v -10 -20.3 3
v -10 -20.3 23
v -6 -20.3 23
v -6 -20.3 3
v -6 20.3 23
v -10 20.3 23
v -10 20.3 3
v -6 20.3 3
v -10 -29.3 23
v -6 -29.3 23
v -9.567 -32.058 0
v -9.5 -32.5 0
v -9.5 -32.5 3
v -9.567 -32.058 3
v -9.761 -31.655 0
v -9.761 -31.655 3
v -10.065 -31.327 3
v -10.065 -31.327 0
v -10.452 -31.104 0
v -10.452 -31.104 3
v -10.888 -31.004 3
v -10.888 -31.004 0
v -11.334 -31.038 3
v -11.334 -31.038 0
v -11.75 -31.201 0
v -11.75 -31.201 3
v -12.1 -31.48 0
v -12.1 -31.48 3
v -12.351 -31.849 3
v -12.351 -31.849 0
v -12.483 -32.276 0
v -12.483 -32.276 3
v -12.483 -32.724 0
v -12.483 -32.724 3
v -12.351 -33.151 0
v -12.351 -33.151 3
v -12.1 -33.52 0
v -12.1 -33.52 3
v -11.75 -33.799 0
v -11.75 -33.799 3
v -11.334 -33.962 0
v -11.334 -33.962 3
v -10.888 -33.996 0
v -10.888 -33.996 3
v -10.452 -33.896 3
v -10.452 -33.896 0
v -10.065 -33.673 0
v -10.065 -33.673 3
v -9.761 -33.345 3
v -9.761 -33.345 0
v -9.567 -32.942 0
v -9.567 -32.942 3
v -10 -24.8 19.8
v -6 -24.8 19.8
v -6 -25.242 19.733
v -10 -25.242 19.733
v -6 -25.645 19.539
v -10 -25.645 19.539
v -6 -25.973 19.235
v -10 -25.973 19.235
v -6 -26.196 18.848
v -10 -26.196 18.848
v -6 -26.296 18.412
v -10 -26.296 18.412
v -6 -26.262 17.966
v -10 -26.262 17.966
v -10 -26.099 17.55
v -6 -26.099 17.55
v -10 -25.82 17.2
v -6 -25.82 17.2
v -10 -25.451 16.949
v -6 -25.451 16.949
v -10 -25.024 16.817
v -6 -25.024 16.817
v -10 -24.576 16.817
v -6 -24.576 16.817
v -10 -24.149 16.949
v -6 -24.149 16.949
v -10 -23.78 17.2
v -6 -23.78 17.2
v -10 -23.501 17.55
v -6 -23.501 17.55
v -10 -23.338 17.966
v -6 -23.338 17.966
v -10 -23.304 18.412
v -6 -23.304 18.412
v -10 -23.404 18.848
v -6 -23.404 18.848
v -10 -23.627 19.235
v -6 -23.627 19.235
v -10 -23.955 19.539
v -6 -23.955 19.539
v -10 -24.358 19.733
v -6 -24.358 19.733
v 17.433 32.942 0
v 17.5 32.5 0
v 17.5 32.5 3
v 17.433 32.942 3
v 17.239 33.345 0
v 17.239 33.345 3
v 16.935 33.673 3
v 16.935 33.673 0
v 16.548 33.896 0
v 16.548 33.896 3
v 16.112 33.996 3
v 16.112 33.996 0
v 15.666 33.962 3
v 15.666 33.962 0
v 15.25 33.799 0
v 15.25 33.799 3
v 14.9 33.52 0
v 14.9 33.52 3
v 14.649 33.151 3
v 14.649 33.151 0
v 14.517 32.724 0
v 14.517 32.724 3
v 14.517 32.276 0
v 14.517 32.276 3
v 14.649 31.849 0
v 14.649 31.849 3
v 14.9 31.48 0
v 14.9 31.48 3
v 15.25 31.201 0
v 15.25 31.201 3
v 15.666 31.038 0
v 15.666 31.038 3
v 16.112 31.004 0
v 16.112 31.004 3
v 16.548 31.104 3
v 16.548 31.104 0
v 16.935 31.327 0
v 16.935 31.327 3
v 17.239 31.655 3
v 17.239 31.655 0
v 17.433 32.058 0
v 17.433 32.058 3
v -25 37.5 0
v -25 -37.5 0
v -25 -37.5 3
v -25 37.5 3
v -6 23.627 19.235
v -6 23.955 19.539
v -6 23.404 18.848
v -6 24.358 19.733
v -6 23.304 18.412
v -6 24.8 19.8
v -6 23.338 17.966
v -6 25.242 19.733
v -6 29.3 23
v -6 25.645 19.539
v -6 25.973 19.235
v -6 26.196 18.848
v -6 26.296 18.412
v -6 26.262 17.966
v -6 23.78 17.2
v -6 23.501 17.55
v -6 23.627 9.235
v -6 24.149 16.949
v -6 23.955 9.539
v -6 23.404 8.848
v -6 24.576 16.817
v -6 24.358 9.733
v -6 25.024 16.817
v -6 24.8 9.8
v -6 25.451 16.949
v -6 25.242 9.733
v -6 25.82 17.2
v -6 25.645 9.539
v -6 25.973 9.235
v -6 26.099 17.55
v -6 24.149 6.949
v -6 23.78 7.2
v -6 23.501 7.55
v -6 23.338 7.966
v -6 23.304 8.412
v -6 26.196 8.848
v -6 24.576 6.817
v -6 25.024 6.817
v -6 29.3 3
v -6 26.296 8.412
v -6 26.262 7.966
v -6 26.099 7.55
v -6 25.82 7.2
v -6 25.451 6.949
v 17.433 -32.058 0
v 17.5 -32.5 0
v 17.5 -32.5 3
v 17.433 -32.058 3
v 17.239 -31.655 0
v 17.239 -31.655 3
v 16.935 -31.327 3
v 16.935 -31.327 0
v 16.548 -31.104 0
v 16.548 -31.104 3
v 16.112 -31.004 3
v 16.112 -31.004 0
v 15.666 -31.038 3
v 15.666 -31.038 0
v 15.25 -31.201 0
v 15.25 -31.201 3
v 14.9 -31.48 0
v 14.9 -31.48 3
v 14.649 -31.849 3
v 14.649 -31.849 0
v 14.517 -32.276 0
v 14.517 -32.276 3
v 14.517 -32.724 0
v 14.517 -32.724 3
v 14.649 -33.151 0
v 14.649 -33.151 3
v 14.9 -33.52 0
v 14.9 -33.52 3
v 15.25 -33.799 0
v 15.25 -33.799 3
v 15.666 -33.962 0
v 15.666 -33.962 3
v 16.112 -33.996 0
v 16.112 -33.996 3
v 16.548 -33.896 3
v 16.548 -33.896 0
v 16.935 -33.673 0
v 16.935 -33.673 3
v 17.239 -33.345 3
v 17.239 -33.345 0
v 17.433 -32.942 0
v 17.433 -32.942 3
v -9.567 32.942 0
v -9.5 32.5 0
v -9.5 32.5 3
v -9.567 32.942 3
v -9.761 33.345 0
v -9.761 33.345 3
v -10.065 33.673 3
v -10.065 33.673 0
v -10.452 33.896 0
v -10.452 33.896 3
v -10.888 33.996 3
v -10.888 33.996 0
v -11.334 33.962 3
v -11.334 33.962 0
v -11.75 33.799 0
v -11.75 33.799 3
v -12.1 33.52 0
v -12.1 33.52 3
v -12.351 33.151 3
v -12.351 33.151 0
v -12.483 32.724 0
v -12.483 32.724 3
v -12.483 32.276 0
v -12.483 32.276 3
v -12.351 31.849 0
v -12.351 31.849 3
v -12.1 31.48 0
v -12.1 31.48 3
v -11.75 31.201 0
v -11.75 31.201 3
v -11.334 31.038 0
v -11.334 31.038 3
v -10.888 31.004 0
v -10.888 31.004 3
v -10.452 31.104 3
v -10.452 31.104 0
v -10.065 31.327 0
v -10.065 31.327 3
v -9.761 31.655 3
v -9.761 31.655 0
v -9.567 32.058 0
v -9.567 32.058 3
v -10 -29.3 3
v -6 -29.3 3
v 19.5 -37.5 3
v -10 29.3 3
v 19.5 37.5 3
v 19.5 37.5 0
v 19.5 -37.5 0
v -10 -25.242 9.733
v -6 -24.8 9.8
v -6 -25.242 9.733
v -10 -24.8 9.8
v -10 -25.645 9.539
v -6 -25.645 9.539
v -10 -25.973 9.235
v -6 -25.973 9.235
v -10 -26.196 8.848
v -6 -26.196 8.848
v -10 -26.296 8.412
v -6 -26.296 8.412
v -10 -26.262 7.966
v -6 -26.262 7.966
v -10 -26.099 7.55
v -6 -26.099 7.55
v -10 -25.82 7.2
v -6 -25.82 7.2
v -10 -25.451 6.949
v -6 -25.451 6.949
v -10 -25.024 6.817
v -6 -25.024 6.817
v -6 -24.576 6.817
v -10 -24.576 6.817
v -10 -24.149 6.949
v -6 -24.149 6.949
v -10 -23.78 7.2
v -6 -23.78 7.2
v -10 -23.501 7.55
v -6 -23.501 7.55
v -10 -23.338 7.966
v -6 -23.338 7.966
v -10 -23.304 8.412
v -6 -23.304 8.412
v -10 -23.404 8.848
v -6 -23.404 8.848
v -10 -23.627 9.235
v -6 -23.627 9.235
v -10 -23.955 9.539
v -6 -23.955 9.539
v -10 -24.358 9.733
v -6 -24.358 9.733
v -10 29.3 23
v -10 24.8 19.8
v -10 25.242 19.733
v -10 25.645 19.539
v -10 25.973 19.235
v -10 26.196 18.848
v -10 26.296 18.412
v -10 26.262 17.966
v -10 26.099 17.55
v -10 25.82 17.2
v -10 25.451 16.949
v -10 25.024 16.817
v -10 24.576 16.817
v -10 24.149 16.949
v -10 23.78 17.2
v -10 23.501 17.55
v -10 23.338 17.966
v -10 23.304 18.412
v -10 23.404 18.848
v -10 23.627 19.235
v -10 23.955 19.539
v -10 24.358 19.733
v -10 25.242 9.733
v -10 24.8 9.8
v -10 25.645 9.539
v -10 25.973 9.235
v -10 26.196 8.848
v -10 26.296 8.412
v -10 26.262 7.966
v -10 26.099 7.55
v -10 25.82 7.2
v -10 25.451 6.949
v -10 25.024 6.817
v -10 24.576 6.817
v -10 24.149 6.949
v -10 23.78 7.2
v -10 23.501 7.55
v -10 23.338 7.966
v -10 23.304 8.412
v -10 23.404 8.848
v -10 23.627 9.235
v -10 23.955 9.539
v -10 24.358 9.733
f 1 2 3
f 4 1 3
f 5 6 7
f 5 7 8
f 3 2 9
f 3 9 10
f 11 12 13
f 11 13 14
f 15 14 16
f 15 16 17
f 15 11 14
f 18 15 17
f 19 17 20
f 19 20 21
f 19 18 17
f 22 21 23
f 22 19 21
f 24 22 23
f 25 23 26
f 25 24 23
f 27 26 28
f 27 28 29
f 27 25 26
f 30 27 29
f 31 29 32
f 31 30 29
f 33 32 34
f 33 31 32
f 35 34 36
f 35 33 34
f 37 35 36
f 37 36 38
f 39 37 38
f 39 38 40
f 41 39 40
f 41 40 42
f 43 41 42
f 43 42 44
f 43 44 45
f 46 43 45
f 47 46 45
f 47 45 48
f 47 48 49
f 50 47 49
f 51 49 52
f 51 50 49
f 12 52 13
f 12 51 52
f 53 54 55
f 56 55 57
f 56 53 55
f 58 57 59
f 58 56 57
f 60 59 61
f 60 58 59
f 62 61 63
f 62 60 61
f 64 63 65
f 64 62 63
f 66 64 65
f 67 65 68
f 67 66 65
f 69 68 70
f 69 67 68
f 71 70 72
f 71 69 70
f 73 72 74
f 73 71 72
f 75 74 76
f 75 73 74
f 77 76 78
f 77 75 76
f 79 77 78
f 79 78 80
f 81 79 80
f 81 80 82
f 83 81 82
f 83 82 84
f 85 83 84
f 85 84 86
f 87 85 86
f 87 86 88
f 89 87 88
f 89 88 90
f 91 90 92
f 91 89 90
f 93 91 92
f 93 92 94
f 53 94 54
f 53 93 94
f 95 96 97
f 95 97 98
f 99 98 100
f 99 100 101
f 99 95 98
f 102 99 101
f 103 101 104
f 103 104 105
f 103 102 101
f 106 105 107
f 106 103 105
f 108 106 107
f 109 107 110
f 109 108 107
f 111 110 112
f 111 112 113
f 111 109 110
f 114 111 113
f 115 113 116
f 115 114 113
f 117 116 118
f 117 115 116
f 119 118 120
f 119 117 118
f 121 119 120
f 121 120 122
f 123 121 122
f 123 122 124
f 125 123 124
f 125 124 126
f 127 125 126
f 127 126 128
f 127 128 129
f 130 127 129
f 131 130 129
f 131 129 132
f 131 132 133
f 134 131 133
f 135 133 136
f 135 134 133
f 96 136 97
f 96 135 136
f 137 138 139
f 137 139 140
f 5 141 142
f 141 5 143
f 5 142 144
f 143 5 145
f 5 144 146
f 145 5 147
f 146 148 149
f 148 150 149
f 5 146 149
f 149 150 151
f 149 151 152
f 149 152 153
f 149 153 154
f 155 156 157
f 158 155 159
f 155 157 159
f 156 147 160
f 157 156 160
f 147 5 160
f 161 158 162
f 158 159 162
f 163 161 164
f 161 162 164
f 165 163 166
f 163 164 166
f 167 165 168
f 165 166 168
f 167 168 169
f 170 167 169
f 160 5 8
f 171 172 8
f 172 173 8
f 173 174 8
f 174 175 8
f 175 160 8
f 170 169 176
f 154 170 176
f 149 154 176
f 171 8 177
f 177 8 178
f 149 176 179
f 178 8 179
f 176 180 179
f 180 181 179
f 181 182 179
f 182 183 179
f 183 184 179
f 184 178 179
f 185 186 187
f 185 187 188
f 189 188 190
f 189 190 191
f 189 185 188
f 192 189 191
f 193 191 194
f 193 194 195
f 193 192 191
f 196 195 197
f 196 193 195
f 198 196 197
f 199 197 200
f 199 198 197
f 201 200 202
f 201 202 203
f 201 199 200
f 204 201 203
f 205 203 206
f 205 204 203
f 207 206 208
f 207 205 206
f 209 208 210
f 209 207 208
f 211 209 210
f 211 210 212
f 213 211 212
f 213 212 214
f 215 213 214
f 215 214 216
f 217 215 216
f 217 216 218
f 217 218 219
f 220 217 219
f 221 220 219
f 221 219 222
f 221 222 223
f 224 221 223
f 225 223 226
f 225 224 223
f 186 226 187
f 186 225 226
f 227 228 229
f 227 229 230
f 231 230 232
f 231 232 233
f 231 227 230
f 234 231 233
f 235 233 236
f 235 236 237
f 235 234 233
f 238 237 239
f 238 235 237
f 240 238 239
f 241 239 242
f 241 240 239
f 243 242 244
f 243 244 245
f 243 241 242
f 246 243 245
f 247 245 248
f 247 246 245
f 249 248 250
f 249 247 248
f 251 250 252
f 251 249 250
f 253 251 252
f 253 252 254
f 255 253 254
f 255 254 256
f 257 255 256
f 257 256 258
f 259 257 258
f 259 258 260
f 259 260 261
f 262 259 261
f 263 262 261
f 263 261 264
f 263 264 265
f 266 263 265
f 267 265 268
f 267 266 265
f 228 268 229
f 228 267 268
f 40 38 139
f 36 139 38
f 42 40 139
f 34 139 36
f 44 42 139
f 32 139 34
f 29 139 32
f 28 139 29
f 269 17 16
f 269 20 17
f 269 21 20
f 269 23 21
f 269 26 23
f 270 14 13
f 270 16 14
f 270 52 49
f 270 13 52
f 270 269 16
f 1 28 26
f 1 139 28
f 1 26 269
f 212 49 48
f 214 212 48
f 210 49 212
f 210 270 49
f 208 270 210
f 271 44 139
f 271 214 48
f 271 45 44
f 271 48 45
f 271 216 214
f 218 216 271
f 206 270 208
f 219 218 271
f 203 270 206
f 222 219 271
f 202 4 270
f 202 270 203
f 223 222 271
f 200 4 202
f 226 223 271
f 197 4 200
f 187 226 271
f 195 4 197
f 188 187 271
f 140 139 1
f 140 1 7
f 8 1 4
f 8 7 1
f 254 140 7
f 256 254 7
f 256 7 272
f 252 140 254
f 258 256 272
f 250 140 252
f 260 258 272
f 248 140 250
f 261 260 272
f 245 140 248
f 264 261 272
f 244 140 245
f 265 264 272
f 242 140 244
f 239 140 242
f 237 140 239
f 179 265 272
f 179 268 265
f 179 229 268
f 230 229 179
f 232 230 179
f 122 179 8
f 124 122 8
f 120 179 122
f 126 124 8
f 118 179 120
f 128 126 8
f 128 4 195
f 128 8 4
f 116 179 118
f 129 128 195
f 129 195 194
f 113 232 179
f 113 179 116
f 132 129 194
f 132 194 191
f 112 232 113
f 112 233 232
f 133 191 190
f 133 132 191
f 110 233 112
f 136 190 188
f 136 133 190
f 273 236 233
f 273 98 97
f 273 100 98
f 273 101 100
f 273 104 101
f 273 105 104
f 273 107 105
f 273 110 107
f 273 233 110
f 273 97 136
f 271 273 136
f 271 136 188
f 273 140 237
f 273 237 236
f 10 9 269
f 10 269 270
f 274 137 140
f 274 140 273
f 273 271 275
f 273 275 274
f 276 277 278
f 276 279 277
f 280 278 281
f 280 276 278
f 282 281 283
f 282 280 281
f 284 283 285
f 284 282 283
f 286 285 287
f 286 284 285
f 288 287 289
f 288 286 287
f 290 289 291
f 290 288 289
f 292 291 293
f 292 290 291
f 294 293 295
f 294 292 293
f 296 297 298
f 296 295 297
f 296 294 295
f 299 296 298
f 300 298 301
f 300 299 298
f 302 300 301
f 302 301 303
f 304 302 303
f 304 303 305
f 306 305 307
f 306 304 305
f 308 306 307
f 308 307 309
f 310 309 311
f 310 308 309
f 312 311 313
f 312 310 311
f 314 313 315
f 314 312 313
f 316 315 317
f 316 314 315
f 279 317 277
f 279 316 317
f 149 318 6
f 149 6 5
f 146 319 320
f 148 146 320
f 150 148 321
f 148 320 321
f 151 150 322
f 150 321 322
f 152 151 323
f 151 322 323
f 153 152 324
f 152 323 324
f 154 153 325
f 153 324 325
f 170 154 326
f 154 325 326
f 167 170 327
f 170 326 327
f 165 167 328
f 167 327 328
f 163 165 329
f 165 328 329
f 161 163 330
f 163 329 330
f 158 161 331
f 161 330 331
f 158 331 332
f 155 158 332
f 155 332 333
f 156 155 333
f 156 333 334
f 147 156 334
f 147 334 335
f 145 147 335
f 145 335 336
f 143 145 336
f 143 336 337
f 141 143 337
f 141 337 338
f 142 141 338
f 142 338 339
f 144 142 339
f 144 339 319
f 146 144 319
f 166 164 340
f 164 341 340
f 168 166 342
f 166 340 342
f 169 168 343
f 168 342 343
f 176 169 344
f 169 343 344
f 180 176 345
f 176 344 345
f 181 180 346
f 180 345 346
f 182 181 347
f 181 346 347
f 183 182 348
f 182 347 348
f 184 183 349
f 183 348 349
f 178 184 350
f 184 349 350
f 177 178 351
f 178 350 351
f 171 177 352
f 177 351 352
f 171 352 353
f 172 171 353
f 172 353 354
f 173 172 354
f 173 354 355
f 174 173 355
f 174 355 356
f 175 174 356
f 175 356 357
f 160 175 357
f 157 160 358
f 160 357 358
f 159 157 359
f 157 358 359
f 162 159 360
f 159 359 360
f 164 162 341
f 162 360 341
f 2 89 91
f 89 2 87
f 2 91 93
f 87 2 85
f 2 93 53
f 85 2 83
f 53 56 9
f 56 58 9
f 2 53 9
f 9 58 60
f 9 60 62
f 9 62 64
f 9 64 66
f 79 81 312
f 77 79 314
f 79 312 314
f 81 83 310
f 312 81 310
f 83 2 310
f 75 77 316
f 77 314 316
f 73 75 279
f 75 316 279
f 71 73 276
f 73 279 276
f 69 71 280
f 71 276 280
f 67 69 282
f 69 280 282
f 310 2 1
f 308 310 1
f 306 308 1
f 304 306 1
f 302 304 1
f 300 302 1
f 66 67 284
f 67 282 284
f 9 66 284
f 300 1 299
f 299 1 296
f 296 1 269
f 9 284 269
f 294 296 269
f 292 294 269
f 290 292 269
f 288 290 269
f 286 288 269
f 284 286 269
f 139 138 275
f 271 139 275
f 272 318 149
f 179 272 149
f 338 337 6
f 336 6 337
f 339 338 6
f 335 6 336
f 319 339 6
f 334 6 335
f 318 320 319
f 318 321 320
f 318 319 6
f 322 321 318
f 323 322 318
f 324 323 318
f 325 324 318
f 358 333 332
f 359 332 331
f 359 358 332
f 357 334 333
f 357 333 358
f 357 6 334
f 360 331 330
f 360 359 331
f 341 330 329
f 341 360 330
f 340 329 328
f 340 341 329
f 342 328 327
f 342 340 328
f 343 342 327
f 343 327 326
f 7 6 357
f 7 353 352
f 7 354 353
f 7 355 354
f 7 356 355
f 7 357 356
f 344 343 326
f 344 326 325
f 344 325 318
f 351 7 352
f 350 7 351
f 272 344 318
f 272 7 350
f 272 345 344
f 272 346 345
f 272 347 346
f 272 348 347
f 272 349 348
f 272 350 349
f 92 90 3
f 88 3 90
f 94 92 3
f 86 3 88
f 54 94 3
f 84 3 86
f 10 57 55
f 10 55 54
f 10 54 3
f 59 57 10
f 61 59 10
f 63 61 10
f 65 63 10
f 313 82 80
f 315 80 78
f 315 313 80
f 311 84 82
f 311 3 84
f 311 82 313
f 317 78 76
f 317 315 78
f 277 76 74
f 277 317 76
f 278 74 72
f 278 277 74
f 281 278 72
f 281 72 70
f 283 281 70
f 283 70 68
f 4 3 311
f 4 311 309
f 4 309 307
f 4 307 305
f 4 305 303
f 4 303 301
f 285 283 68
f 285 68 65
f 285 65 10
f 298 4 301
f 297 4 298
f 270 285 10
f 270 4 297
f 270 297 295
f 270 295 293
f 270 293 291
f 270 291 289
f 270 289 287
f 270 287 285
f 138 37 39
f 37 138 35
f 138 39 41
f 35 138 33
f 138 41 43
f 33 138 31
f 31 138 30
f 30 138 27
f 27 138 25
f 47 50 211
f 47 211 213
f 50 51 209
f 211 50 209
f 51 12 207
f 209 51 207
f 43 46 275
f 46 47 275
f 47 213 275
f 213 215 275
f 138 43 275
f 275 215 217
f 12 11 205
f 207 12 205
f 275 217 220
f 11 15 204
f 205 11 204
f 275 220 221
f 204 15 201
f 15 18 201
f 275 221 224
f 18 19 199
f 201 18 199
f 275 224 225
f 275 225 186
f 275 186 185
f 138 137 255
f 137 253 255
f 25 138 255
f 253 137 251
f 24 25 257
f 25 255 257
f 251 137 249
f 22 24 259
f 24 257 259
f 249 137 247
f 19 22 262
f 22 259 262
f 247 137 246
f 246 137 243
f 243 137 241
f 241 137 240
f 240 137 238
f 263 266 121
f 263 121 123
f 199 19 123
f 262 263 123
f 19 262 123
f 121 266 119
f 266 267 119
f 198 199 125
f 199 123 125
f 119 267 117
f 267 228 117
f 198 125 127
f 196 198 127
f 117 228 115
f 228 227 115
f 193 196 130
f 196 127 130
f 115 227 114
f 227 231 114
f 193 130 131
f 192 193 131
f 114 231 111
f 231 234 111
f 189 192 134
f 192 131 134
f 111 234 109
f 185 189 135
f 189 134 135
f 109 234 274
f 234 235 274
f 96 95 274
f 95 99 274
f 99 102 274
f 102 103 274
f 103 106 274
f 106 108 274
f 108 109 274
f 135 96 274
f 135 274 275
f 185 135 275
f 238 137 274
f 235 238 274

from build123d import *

# Parameters (mm, degrees)
SKETCH1_W           = 50
SKETCH1_H           = 75
SKETCH1_R           = 1.5
BOSS_EXTRUDE1_DEPTH = 3
SKETCH2_W           = 4
SKETCH2_H           = 9
BOSS_EXTRUDE2_DEPTH = 20
SKETCH3_R           = 1.5
CUT_EXTRUDE2_DEPTH  = 57.216100896
SKETCH4_W           = 5.5
SKETCH4_H           = 75
CUT_EXTRUDE3_DEPTH  = 10


with BuildPart() as part:
    # Sketch1 → Boss-Extrude1 (new body)
    with BuildSketch(Plane.XY):
        Rectangle(SKETCH1_W, SKETCH1_H)
        with Locations((-11, 32.5)):
            Circle(SKETCH1_R, mode=Mode.SUBTRACT)
        with Locations((16, 32.5)):
            Circle(SKETCH1_R, mode=Mode.SUBTRACT)
        with Locations((16, -32.5)):
            Circle(SKETCH1_R, mode=Mode.SUBTRACT)
        with Locations((-11, -32.5)):
            Circle(SKETCH1_R, mode=Mode.SUBTRACT)
    extrude(amount=BOSS_EXTRUDE1_DEPTH)

    # Sketch2 → Boss-Extrude2 (add)
    with BuildSketch(Plane.XY.offset(3)):
        with Locations((-8, 24.8)):
            Rectangle(SKETCH2_W, SKETCH2_H)
    boss_extrude2 = extrude(amount=BOSS_EXTRUDE2_DEPTH)

    # Sketch3 → Cut-Extrude2 (cut, symmetric)
    with BuildSketch(Plane.ZY.offset(10)):
        with Locations((18.3, 24.8)):
            Circle(SKETCH3_R)
        with Locations((8.3, 24.8)):
            Circle(SKETCH3_R)
    cut_extrude2 = extrude(amount=CUT_EXTRUDE2_DEPTH, both=True, mode=Mode.SUBTRACT)

    # Mirror3: Boss-Extrude2, Cut-Extrude2 across plane
    add(boss_extrude2.mirror(Plane.ZX))
    add(cut_extrude2.mirror(Plane.ZX), mode=Mode.SUBTRACT)

    # Sketch4 → Cut-Extrude3 (cut)
    with BuildSketch(Plane.XY.offset(3)):
        with Locations((22.25, 0)):
            Rectangle(SKETCH4_W, SKETCH4_H)
    extrude(amount=-CUT_EXTRUDE3_DEPTH, mode=Mode.SUBTRACT)


solid = part.part
